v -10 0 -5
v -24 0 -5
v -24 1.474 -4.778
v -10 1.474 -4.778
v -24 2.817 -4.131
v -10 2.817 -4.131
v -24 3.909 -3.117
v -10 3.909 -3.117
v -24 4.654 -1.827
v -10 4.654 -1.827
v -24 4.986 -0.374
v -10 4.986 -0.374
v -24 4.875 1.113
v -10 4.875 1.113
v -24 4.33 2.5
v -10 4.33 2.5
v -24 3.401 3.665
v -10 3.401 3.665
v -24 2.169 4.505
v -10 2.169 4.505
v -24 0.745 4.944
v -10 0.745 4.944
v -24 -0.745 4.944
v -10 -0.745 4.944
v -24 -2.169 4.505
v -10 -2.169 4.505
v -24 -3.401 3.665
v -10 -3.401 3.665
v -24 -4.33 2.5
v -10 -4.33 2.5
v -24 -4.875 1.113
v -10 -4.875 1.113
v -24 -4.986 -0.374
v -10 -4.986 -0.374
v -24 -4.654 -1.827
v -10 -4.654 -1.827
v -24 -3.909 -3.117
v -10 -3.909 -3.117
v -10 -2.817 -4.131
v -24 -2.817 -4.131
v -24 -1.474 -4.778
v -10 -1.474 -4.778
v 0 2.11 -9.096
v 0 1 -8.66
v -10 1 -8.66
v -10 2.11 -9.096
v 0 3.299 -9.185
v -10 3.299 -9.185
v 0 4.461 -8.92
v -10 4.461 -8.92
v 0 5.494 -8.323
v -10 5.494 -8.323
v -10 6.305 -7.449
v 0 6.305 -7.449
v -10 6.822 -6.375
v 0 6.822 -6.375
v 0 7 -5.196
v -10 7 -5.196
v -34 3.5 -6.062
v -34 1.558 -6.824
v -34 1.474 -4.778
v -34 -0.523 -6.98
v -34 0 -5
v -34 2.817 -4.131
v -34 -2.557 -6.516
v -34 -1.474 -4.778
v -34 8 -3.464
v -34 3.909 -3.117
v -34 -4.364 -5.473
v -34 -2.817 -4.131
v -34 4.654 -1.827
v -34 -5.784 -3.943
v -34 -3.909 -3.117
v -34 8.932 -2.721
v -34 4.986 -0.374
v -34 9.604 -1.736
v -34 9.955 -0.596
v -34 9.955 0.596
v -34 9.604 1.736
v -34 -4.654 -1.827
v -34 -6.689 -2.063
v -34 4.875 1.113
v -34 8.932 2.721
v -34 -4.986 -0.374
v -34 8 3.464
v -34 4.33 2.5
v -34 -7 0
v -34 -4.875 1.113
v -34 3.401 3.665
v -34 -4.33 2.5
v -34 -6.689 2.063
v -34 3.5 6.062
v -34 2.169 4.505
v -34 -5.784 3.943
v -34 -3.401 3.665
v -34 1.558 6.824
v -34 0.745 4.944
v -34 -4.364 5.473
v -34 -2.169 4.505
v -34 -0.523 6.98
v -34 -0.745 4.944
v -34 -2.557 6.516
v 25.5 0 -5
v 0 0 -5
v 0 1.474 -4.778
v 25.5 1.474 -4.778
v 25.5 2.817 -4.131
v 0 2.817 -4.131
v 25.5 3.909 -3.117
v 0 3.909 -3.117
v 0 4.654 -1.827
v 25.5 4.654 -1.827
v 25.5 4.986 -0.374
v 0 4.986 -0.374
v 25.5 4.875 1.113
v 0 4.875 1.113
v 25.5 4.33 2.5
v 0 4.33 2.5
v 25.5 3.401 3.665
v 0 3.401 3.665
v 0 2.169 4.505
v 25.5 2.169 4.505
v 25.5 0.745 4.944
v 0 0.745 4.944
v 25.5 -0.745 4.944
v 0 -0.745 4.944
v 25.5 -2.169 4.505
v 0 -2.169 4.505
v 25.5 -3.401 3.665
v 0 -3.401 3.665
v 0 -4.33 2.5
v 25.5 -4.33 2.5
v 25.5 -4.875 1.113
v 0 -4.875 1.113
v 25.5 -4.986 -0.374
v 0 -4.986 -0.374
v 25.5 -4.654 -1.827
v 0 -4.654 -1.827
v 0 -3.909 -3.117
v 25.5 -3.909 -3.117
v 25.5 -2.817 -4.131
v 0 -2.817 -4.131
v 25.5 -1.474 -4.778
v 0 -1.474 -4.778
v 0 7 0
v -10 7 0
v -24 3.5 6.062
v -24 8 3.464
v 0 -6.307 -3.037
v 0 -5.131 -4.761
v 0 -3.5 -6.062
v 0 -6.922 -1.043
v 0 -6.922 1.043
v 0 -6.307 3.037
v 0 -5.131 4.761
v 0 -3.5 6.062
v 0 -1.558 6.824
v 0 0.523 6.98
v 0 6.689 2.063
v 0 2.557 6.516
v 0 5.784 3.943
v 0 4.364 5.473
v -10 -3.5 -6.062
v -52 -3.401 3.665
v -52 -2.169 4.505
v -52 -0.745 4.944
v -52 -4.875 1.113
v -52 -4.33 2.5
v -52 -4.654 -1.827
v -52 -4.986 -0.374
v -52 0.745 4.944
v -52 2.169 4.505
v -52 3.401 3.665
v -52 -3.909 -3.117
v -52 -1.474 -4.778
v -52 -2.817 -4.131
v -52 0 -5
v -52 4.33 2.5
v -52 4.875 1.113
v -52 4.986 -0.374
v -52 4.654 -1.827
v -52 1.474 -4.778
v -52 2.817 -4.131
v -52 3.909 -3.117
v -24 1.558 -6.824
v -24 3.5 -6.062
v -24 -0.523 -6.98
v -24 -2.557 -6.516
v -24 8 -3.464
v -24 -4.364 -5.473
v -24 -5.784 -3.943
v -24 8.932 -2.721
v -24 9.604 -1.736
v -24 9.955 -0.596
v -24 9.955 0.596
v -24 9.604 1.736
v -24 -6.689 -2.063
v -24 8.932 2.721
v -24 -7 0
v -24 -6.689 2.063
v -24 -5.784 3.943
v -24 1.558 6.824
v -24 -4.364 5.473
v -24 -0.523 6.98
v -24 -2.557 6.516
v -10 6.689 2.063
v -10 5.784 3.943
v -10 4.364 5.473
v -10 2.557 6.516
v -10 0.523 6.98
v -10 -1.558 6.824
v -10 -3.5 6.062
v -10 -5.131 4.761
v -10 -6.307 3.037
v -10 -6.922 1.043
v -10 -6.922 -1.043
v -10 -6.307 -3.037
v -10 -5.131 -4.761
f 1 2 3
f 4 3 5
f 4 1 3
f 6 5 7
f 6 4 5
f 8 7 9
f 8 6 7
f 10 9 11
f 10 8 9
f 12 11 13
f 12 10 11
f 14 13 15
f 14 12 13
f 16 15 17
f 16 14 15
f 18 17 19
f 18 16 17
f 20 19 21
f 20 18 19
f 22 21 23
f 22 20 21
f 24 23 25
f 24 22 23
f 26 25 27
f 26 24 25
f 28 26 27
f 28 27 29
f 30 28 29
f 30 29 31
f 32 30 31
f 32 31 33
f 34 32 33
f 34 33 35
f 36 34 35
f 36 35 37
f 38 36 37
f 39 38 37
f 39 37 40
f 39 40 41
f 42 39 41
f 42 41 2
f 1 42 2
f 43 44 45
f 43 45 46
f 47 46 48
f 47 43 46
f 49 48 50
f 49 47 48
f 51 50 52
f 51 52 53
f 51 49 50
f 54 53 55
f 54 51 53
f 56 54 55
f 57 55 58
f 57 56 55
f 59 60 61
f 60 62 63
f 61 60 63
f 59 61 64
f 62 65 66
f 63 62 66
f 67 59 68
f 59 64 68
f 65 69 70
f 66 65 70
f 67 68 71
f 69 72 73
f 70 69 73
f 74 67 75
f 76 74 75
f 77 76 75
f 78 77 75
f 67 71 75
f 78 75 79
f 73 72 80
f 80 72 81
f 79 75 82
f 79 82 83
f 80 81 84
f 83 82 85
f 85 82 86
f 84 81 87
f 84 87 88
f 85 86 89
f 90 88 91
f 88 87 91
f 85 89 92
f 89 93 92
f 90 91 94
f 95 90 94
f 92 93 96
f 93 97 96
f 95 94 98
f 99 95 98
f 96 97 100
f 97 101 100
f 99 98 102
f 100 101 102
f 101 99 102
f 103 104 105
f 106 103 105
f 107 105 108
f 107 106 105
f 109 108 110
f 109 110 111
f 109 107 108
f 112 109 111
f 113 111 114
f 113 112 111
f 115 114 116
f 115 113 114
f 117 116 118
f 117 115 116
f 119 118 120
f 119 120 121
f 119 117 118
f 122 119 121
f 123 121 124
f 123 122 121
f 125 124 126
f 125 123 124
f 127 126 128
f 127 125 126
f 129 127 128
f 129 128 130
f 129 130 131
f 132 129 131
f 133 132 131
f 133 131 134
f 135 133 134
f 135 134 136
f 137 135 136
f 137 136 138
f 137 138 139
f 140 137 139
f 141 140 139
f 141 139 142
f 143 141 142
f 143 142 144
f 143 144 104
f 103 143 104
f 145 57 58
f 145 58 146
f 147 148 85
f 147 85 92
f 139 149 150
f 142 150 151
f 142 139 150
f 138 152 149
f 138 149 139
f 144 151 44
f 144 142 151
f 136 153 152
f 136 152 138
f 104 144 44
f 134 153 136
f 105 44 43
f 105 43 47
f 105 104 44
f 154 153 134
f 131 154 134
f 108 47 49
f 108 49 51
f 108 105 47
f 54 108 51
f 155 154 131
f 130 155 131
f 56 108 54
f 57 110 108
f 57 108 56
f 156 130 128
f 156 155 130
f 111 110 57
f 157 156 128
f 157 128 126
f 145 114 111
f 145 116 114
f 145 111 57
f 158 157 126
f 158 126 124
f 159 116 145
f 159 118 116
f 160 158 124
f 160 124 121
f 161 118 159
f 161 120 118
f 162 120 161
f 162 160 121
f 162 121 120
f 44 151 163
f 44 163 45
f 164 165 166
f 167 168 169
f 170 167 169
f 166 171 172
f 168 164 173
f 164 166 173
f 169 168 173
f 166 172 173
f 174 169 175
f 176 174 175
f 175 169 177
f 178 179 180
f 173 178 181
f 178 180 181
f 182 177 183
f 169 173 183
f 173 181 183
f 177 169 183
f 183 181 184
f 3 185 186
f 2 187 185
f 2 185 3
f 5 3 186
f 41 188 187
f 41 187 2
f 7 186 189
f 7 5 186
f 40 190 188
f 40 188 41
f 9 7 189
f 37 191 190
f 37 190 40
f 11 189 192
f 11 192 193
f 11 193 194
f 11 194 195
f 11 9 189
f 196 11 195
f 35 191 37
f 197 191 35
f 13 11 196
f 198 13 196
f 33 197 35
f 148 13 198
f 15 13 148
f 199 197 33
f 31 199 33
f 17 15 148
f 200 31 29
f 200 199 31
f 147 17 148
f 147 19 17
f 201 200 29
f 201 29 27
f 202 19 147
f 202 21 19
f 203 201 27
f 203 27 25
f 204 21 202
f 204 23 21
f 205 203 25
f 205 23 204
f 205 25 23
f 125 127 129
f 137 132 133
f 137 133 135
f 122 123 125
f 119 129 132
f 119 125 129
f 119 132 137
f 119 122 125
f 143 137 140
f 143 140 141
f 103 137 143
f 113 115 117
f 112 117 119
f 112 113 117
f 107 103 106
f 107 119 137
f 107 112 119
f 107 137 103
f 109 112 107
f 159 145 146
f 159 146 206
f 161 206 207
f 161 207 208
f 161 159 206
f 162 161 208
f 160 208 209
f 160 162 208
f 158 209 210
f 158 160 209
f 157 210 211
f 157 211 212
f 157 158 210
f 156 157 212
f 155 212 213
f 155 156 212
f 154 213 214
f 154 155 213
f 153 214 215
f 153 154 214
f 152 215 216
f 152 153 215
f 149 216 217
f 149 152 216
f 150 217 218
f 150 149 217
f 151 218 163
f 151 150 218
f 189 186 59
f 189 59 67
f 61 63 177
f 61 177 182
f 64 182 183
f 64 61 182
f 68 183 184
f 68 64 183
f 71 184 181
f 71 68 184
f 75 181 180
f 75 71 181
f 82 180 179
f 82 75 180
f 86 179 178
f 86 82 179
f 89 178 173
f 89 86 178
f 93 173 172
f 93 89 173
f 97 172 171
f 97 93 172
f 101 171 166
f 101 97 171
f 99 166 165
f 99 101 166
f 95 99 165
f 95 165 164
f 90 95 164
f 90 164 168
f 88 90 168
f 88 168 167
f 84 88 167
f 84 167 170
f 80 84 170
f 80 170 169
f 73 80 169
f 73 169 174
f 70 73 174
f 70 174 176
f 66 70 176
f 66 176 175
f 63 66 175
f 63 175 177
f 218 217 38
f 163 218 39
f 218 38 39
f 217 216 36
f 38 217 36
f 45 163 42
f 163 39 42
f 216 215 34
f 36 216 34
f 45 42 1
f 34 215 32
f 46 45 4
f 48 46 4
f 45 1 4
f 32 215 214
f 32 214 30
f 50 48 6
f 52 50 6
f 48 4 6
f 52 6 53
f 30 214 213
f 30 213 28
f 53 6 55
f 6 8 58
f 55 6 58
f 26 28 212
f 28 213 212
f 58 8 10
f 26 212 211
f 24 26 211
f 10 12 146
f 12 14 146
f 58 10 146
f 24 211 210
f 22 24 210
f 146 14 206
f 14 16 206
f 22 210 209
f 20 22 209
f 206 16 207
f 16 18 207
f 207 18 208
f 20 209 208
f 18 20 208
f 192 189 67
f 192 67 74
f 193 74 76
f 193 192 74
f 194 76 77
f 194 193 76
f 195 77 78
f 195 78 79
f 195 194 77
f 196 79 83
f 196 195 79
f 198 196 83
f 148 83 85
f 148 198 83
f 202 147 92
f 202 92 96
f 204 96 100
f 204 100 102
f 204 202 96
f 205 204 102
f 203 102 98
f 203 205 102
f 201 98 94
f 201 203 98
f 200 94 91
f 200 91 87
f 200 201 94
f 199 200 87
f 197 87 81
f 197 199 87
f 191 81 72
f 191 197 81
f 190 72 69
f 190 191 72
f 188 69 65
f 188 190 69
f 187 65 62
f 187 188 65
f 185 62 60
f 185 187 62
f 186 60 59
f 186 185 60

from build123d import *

# Parameters (mm, degrees)
SKETCH2_R             = 5
BOSS_EXTRUDE1_DEPTH   = 10
BODY_MOVE_COPY2_ANGLE = 60
BOSS_EXTRUDE2_START   = 28
SKETCH3_R             = 5
BOSS_EXTRUDE2_DEPTH   = 80
SKETCH4_R             = 5
CUT_EXTRUDE1_DEPTH    = 2.5


with BuildPart() as part:
    # Sketch2 → Boss-Extrude1 (new body)
    with BuildSketch(Plane.YZ):
        with BuildLine():
            Line((-3.5, -6.062177826), (1, -8.660254038))
            ThreePointArc((1, -8.660254038), (5, -8.660254038), (7, -5.196152423))
            Line((7, -5.196152423), (7, 0))
            ThreePointArc((7, 0), (-3.5, 6.062177826), (-3.5, -6.062177826))
        make_face()
        with Locations(Location((0, 0, 0), (0, 0, 270))):
            Circle(SKETCH2_R, mode=Mode.SUBTRACT)
    extrude(amount=-BOSS_EXTRUDE1_DEPTH)


with BuildPart() as body_2:
    # Body-Move/Copy1: copy of part
    add(part.part.moved(Location((-24, 0, 0))))


with BuildPart() as body_2_1:
    # Body-Move/Copy2: moved
    add(body_2.part.rotate(Axis((0, 0, 0), (1, 0, 0)), BODY_MOVE_COPY2_ANGLE))


with BuildPart() as part_1:
    add(part.part)

    add(body_2_1.part)  # Boss-Extrude2 merges body 2
    # Sketch3 → Boss-Extrude2 (add)
    with BuildSketch(Plane.YZ.offset(BOSS_EXTRUDE2_START)):
        with Locations(Location((0, 0, 0), (0, 0, 270))):
            Circle(SKETCH3_R)
    extrude(amount=-BOSS_EXTRUDE2_DEPTH)

    # Sketch4 → Cut-Extrude1 (cut)
    with BuildSketch(Plane.YZ.offset(28)):
        with Locations(Location((0, 0, 0), (0, 0, 270))):
            Circle(SKETCH4_R)
    extrude(amount=-CUT_EXTRUDE1_DEPTH, mode=Mode.SUBTRACT)


solid = part_1.part
